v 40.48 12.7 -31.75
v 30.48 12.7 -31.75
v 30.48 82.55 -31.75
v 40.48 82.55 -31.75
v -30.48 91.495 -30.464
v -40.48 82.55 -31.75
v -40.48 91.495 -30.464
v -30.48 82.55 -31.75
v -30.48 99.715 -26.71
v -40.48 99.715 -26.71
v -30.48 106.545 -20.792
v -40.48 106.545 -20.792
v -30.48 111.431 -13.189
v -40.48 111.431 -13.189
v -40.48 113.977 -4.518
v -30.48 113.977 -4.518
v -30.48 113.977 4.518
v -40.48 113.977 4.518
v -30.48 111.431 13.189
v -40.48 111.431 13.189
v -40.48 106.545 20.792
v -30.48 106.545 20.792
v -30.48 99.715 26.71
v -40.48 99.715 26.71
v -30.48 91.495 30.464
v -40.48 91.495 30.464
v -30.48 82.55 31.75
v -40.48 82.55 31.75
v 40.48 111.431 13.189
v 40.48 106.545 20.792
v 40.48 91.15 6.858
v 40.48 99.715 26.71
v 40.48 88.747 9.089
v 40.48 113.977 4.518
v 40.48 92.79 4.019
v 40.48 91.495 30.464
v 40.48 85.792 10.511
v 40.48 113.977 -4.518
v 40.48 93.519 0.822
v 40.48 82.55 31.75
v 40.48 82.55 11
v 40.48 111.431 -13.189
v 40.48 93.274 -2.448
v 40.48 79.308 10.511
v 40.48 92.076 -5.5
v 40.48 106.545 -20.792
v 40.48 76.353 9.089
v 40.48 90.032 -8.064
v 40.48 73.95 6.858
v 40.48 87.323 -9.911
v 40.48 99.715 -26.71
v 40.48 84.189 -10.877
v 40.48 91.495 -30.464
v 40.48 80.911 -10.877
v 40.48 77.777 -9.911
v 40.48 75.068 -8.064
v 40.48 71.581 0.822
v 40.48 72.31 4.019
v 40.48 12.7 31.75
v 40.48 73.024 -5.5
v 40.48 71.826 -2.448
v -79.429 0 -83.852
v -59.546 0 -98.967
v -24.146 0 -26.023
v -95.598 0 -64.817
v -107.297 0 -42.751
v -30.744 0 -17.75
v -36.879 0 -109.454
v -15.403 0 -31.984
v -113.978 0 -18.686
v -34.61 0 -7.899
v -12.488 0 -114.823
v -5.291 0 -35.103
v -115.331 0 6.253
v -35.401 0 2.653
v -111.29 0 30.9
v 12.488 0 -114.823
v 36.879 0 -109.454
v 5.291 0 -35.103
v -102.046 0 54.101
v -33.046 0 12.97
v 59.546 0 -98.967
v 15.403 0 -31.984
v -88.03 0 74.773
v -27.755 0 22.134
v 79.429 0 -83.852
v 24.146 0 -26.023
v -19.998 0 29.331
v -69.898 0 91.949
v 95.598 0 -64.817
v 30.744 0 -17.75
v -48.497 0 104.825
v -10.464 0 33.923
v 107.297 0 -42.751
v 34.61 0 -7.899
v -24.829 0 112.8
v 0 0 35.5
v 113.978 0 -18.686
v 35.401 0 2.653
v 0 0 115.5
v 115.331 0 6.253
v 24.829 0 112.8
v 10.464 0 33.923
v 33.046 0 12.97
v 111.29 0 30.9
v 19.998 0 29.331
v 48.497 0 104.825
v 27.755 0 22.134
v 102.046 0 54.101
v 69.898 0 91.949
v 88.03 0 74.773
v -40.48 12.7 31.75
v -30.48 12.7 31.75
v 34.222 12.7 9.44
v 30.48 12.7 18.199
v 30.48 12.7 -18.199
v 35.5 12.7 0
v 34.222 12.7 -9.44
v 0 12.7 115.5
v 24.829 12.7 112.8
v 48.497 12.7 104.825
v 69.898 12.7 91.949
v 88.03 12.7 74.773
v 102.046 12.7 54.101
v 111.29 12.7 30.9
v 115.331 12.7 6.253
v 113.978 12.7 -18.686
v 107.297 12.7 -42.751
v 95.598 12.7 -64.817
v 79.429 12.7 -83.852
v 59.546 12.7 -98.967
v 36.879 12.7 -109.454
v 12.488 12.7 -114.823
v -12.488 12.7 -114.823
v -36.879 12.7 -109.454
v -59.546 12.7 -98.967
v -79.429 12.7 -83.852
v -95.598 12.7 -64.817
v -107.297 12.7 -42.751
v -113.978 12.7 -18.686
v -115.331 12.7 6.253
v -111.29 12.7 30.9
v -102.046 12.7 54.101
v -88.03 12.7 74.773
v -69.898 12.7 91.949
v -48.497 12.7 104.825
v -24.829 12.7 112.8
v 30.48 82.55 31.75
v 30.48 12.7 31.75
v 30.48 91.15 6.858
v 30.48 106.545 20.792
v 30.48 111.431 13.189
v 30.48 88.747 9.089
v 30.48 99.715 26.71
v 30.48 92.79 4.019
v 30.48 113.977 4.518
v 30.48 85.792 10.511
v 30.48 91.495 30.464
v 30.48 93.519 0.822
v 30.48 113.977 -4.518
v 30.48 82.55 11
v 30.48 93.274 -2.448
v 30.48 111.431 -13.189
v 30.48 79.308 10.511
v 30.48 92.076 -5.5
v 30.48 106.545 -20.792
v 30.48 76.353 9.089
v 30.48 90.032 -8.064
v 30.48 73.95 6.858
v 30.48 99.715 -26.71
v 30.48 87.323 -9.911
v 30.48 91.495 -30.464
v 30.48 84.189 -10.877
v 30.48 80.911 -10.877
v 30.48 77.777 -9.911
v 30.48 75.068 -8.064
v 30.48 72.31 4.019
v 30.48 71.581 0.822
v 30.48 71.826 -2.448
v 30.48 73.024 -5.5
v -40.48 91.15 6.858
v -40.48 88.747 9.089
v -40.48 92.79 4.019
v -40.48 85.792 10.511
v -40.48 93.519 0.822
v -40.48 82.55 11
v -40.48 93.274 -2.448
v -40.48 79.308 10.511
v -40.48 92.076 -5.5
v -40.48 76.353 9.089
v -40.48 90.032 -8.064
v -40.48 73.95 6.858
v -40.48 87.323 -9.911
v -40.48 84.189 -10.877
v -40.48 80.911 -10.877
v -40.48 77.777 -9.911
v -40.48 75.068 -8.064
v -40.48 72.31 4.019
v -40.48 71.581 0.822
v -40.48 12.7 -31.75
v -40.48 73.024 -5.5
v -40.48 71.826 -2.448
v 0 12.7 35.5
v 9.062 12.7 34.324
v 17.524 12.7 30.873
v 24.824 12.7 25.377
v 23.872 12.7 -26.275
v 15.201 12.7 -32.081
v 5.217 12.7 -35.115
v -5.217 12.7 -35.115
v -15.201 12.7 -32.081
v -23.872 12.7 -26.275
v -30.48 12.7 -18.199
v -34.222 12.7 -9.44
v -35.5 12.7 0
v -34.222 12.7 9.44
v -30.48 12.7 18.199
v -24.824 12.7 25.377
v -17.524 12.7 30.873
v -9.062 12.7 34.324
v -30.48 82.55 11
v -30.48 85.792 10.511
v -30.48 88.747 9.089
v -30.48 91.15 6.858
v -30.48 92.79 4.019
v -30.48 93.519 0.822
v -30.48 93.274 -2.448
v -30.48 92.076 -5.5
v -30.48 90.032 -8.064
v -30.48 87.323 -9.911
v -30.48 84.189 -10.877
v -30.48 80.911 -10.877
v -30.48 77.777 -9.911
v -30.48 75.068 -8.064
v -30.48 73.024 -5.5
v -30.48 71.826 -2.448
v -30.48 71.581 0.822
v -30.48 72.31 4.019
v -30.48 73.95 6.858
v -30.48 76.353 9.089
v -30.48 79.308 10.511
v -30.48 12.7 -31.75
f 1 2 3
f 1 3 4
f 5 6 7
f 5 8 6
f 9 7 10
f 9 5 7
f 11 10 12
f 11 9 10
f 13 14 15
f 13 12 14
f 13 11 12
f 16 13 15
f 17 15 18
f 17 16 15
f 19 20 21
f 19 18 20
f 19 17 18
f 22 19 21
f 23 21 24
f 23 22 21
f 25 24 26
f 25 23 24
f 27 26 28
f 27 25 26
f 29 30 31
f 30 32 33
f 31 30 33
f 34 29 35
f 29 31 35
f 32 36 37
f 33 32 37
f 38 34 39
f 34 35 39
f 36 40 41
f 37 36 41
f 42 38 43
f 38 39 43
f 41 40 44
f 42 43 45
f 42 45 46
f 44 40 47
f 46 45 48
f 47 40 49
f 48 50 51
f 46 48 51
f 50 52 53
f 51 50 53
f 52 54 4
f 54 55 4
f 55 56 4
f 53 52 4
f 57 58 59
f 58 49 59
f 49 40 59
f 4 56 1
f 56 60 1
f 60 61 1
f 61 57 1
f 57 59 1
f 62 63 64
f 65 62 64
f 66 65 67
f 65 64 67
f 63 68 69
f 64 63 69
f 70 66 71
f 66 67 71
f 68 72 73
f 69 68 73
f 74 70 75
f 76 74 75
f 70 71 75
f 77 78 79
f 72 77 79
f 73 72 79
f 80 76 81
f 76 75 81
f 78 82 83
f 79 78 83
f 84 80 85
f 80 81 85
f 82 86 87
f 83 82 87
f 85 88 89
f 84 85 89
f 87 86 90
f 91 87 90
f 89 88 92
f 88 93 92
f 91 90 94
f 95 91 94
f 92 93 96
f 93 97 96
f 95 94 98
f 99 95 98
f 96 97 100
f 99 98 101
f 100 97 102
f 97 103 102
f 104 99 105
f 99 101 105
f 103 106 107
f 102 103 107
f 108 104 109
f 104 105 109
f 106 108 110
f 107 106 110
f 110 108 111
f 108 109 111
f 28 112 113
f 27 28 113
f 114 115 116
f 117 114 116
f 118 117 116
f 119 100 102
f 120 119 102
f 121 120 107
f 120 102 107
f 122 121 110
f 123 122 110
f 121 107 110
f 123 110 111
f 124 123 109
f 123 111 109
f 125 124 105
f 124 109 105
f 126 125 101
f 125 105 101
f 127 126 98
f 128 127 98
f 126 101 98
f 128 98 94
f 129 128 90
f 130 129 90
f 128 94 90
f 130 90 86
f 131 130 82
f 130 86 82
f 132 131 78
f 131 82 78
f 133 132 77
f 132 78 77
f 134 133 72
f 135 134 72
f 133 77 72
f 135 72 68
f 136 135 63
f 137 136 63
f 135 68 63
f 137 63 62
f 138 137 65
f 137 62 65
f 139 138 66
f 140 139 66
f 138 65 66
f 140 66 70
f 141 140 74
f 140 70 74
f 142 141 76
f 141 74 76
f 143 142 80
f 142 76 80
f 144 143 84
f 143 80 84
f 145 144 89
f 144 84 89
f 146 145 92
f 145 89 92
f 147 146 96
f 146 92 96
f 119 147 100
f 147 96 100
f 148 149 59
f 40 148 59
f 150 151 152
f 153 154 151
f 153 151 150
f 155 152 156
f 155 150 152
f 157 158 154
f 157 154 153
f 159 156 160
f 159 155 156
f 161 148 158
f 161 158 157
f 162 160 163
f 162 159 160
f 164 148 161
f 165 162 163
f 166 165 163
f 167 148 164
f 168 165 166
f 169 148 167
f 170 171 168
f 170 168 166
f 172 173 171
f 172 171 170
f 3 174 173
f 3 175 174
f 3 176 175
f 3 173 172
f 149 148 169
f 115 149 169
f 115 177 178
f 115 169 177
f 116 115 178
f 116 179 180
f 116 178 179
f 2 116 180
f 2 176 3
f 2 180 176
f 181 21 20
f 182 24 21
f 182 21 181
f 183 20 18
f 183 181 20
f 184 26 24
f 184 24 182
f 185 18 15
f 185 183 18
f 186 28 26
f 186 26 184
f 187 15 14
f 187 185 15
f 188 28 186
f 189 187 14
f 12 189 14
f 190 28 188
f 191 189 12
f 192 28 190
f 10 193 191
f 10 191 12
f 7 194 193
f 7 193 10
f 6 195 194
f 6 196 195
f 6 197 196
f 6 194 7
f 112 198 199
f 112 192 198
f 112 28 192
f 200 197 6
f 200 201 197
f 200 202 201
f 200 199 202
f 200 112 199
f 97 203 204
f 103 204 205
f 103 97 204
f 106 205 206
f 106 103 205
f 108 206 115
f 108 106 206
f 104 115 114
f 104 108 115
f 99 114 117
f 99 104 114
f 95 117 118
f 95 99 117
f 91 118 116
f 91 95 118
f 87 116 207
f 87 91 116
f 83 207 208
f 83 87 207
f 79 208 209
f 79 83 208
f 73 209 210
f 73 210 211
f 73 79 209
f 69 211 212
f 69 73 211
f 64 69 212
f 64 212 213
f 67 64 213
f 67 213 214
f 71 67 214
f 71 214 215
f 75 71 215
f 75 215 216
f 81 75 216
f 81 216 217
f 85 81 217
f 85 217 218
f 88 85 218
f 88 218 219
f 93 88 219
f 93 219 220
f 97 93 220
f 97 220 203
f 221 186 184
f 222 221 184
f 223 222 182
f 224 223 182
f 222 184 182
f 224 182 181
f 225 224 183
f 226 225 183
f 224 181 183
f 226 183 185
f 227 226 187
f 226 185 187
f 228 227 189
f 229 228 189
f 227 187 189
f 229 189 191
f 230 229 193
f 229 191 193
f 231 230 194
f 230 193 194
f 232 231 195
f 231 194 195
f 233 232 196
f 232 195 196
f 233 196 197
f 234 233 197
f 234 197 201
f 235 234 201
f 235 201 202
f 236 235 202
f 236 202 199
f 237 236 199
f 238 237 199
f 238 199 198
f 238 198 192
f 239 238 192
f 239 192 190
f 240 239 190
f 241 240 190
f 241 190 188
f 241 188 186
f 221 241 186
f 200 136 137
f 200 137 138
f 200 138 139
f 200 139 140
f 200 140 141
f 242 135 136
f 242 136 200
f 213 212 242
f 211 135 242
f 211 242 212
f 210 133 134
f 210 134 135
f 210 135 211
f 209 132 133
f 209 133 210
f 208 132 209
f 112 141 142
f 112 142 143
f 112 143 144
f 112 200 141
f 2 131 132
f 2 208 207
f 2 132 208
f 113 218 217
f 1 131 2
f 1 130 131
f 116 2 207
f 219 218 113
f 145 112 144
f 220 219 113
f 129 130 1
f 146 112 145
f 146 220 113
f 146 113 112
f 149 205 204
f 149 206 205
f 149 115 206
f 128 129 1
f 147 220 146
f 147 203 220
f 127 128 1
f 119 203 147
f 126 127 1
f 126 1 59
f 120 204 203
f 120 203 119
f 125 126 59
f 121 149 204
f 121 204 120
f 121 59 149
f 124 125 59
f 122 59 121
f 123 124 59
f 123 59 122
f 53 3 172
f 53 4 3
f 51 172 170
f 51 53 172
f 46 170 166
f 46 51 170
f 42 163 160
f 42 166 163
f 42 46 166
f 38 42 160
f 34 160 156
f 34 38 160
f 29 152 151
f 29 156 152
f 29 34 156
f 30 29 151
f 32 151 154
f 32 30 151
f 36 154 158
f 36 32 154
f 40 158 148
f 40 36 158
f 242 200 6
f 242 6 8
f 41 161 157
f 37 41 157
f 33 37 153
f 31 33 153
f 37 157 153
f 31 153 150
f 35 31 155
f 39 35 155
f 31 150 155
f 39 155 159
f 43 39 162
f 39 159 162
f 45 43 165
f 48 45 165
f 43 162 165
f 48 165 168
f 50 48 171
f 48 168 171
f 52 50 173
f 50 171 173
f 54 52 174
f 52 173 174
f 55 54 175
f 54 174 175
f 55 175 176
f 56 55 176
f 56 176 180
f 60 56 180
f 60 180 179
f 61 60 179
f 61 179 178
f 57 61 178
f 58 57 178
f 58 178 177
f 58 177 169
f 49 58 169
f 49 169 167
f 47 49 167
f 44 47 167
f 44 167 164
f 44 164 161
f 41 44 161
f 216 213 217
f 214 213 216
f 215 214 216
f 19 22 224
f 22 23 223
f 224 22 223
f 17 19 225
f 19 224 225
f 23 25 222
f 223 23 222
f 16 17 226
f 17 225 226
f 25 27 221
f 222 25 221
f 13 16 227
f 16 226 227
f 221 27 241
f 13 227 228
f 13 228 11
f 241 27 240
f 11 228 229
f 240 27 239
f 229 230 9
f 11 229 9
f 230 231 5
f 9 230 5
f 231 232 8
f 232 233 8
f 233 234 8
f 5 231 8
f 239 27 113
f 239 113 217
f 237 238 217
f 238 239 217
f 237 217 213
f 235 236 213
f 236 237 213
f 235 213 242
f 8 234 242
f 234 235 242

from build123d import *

# Parameters (mm, degrees)
SKETCH1_R           = 115.5
SKETCH1_R_2         = 35.5
BOSS_EXTRUDE1_DEPTH = 12.7
SKETCH2_W           = 10
SKETCH2_H           = 63.5
BOSS_EXTRUDE2_DEPTH = 101.6
FILLET1_RADIUS      = 31.75
FILLET1_LENGTH      = 10
FILLET2_RADIUS      = 31.75
FILLET2_LENGTH      = 10
SKETCH3_R           = 11
CUT_EXTRUDE1_DEPTH  = 101.6


with BuildPart() as part:
    # Sketch1 → Boss-Extrude1 (new body)
    with BuildSketch(Plane(origin=(0, 0, 0), x_dir=(1, 0, 0), z_dir=(0, 1, 0))):
        with Locations(Location((0, 0, 0), (0, 0, 270))):
            Circle(SKETCH1_R)
        with Locations(Location((0, 0, 0), (0, 0, 270))):
            Circle(SKETCH1_R_2, mode=Mode.SUBTRACT)
    extrude(amount=BOSS_EXTRUDE1_DEPTH)

    # Sketch2 → Boss-Extrude2 (add)
    with BuildSketch(Plane(origin=(0, 12.7, 0), x_dir=(1, 0, 0), z_dir=(0, 1, 0))):
        with Locations((35.48, 0)):
            Rectangle(SKETCH2_W, SKETCH2_H)
        with Locations((-35.48, 0)):
            Rectangle(SKETCH2_W, SKETCH2_H)
    extrude(amount=BOSS_EXTRUDE2_DEPTH)

    # Fillet1: full round fillet: the end face becomes a half cylinder, R = half its width
    fillet1_face = Plane((35.48, 114.3, 0), x_dir=(1, 0, 0), z_dir=(0, 1, 0))  # on the end face: x along it, z out of the body
    fillet1_slab = fillet1_face.offset(-FILLET1_RADIUS / 2) * Box(FILLET1_LENGTH, 2 * FILLET1_RADIUS, FILLET1_RADIUS, mode=Mode.PRIVATE)  # the body's end, R deep
    fillet1_round = Plane((35.48, 82.55, 0), x_dir=(0, 1, 0), z_dir=(1, 0, 0)) * Cylinder(FILLET1_RADIUS, FILLET1_LENGTH, mode=Mode.PRIVATE)  # its axis R under the face
    add(fillet1_slab - fillet1_round, mode=Mode.SUBTRACT)

    # Fillet2: full round fillet: the end face becomes a half cylinder, R = half its width
    fillet2_face = Plane((-35.48, 114.3, 0), x_dir=(1, 0, 0), z_dir=(0, 1, 0))  # on the end face: x along it, z out of the body
    fillet2_slab = fillet2_face.offset(-FILLET2_RADIUS / 2) * Box(FILLET2_LENGTH, 2 * FILLET2_RADIUS, FILLET2_RADIUS, mode=Mode.PRIVATE)  # the body's end, R deep
    fillet2_round = Plane((-35.48, 82.55, 0), x_dir=(0, 1, 0), z_dir=(1, 0, 0)) * Cylinder(FILLET2_RADIUS, FILLET2_LENGTH, mode=Mode.PRIVATE)  # its axis R under the face
    add(fillet2_slab - fillet2_round, mode=Mode.SUBTRACT)

    # Sketch3 → Cut-Extrude1 (cut)
    with BuildSketch(Plane.ZY.offset(40.48)):
        with Locations((0, 82.55)):
            Circle(SKETCH3_R)
    extrude(amount=-CUT_EXTRUDE1_DEPTH, mode=Mode.SUBTRACT)


solid = part.part
